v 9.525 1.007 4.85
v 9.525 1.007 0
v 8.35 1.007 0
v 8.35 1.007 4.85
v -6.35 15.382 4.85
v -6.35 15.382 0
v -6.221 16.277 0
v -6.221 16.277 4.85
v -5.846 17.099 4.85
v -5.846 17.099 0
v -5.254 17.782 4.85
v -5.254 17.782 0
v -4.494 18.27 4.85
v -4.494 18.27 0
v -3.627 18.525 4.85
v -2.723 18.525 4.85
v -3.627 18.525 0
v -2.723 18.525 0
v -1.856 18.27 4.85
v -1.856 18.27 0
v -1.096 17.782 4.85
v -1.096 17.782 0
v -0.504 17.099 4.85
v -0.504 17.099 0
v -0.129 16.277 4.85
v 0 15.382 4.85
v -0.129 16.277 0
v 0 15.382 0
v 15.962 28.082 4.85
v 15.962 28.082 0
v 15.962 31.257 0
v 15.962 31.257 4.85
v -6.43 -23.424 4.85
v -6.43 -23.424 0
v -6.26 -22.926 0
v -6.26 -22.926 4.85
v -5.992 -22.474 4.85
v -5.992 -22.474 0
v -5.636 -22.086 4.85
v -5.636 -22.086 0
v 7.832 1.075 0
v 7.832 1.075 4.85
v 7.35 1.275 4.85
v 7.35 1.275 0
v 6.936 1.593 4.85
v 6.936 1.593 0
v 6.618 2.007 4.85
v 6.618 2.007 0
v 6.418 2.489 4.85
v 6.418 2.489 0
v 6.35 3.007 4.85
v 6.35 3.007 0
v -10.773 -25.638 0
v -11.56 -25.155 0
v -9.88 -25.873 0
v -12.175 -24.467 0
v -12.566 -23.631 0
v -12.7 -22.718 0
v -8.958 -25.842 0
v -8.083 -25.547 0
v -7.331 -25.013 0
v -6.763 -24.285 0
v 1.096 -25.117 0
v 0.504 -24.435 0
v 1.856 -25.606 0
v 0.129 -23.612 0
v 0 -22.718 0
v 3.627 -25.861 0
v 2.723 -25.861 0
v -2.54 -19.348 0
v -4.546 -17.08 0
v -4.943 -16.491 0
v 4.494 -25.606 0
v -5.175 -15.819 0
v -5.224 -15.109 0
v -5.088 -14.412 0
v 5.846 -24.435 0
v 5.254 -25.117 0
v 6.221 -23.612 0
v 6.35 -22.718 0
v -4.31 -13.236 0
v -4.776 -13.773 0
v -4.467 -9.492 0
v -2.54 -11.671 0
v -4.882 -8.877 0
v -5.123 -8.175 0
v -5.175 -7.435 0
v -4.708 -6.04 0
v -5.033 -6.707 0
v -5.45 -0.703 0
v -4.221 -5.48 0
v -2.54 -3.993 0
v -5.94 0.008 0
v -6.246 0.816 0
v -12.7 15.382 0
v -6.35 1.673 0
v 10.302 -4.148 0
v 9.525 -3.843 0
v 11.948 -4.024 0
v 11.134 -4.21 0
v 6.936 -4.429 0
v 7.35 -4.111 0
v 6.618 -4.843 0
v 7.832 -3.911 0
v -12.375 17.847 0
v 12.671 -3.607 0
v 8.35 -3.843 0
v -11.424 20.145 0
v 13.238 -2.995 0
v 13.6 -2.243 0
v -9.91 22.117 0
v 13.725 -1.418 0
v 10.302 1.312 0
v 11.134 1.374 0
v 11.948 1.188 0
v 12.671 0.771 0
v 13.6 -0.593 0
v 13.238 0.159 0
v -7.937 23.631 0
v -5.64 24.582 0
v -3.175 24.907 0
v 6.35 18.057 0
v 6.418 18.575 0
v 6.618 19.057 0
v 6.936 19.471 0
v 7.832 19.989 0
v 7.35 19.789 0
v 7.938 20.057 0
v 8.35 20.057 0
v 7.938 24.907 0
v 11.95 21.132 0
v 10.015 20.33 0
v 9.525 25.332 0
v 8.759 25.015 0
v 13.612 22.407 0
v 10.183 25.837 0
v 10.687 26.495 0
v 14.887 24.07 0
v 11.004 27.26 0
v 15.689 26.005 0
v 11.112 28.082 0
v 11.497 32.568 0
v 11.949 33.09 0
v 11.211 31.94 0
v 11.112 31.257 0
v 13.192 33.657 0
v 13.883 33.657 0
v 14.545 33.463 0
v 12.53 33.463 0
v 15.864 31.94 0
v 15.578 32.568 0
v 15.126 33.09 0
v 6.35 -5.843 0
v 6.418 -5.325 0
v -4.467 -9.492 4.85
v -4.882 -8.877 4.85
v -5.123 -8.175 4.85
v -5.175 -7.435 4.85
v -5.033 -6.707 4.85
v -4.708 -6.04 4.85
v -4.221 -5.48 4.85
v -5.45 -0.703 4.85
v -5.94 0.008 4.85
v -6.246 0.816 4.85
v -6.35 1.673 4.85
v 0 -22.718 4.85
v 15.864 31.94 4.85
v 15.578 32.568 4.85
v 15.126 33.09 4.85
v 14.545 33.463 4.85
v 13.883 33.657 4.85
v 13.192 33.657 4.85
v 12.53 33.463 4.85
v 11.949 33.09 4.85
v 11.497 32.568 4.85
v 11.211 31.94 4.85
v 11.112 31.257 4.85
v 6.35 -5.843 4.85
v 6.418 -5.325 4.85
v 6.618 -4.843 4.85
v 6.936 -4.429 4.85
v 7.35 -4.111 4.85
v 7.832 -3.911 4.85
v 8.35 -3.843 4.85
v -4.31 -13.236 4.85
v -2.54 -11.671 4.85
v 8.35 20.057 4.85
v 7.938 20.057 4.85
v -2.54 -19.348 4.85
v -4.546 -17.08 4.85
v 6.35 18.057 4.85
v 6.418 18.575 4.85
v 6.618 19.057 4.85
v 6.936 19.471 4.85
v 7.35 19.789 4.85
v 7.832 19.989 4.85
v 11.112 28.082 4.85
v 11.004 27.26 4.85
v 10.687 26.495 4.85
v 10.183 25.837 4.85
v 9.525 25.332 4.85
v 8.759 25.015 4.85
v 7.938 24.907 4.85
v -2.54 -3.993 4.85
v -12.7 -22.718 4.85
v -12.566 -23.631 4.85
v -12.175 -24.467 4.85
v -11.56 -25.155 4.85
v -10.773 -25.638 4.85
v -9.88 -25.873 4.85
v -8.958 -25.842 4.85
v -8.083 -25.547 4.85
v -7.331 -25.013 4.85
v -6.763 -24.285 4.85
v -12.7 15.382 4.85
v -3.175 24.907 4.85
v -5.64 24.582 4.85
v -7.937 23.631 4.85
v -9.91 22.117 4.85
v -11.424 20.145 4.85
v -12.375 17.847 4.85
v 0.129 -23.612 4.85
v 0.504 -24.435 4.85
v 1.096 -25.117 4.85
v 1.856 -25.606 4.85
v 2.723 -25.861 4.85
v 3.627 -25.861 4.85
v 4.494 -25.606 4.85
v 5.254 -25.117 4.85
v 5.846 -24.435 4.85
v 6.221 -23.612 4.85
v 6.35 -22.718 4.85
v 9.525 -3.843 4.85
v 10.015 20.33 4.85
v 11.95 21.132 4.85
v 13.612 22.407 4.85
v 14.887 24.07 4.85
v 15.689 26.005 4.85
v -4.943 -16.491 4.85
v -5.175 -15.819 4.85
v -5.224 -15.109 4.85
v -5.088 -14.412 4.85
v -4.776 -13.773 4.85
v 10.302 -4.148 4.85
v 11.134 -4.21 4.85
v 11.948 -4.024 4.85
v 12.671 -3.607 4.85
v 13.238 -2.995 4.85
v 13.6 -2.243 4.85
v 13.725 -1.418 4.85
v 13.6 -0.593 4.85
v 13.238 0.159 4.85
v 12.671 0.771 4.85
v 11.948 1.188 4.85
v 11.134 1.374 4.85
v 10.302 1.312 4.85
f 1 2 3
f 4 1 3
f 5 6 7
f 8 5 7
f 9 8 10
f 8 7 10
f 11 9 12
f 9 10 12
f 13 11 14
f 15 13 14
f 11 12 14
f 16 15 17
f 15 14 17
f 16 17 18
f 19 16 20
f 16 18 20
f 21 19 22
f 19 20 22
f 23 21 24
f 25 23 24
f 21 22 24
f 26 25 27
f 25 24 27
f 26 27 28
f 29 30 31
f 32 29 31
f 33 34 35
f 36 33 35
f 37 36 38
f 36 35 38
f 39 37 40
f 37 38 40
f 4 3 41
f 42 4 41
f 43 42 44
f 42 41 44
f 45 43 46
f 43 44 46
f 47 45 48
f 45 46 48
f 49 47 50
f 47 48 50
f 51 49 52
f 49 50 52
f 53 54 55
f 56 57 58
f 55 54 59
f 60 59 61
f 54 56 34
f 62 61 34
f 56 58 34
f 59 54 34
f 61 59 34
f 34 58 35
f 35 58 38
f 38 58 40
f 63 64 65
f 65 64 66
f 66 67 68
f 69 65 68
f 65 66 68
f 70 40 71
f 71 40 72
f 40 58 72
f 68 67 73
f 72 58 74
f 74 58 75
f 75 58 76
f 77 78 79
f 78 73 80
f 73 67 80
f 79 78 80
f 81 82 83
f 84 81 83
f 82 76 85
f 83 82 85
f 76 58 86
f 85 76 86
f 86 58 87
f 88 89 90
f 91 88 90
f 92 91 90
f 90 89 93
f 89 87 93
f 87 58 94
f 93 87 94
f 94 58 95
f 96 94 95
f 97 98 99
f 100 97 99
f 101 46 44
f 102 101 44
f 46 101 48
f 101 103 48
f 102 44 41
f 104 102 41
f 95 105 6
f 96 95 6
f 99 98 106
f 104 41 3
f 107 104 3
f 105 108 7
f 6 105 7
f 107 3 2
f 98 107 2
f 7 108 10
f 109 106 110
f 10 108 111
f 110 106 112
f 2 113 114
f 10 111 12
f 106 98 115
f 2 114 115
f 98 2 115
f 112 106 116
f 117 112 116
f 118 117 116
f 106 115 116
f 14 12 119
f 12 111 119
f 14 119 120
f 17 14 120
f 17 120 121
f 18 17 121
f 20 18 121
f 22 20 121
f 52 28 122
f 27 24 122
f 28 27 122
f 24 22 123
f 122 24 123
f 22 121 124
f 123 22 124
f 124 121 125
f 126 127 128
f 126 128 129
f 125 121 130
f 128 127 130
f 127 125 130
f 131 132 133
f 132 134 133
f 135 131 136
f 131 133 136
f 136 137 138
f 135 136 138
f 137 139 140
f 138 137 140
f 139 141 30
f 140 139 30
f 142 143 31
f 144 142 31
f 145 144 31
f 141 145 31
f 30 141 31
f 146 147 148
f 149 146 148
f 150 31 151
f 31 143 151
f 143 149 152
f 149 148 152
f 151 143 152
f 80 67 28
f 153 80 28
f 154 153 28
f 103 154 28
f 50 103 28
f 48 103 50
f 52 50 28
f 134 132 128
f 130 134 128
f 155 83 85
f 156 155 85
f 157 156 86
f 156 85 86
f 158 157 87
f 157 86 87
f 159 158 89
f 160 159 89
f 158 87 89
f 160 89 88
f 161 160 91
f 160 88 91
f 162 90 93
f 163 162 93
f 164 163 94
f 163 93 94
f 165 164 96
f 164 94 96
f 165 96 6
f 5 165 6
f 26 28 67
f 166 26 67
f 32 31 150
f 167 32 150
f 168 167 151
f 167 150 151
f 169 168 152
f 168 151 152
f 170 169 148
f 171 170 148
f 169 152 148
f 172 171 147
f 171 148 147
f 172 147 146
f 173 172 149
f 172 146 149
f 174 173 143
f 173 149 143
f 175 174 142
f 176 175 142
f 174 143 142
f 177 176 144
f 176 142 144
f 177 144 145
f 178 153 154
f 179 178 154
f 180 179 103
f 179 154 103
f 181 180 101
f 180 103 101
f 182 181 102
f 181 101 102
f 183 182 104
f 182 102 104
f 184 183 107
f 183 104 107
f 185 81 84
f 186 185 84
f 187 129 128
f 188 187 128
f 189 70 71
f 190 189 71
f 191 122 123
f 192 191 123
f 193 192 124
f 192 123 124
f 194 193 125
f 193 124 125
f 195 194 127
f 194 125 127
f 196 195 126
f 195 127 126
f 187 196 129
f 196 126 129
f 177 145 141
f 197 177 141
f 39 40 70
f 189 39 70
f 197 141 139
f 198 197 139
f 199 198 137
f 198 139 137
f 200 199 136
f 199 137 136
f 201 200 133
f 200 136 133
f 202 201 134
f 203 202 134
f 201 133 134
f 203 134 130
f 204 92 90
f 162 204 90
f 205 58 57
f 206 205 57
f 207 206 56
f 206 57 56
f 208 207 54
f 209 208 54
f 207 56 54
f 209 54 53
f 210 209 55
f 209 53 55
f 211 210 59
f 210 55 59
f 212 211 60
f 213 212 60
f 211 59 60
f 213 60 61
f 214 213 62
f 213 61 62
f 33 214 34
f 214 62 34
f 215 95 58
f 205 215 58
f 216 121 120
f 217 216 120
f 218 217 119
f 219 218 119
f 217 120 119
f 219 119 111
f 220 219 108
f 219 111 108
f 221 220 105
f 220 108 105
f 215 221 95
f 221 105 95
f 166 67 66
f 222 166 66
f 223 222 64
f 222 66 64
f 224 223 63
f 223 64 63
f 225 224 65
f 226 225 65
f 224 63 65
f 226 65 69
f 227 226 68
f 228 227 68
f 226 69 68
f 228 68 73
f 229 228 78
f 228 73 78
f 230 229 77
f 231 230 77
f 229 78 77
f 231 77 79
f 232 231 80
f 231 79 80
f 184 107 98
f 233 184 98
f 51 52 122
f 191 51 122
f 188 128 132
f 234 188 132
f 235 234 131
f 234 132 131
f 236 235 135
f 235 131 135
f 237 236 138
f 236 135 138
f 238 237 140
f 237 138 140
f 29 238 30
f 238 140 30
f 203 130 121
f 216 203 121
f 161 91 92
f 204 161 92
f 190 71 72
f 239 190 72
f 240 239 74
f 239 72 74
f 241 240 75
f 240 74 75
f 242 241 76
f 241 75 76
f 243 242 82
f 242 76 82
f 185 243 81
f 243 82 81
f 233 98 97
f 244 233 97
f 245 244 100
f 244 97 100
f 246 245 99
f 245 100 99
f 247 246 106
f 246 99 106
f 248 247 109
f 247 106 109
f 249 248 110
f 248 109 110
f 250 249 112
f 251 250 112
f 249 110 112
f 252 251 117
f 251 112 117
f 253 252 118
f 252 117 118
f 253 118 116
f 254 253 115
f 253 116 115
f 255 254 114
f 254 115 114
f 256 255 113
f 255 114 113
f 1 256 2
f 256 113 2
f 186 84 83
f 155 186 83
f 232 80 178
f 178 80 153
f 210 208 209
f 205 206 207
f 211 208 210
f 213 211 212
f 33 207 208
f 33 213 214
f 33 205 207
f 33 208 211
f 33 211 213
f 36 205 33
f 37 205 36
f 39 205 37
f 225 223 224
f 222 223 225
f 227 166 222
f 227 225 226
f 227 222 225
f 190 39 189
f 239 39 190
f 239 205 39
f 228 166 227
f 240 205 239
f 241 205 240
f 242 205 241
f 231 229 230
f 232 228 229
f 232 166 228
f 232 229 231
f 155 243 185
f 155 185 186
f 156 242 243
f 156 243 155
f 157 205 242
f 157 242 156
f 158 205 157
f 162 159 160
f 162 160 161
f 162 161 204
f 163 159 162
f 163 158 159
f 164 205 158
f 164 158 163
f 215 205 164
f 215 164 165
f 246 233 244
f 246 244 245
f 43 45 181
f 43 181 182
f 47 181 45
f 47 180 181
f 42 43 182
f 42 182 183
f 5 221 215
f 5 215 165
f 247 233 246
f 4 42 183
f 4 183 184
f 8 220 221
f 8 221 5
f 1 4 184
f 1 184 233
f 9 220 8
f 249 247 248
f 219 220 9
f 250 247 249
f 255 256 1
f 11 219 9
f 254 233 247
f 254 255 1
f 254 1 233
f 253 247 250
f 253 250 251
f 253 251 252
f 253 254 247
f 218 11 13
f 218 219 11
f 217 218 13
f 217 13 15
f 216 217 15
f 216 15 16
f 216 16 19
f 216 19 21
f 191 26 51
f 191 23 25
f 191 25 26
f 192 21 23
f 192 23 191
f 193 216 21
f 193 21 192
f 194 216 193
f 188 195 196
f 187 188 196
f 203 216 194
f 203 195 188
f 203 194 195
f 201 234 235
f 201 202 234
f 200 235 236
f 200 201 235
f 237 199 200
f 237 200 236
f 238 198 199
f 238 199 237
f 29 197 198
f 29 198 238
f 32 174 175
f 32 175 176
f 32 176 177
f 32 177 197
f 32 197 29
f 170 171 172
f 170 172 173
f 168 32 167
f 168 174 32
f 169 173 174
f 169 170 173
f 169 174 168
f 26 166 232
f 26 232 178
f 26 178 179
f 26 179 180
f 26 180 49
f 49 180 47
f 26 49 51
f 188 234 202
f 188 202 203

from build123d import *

# Parameters (mm, degrees)
F3_DEPTH = 4.85


with BuildPart() as f3:
    # F2 (on Top) → F3 (new body)
    with BuildSketch(Plane.XY):
        with BuildLine():
            Line((7.9375, 24.907028094), (-3.175, 24.907028094))
            ThreePointArc((-3.175, 24.907028094), (-9.9101920908, 22.1172201848), (-12.7, 15.382028094))
            Line((-12.7, 15.382028094), (-12.7, -22.717971906))
            ThreePointArc((-12.7, -22.717971906), (-9.8802997587, -25.8730292877), (-6.4295199487, -23.4241080485))
            ThreePointArc((-6.4295199487, -23.4241080485), (-6.1376092102, -22.6929936641), (-5.6358581606, -22.0863751625))
            Line((-5.6358581606, -22.0863751625), (-2.54, -19.3483561519))
            Line((-2.54, -19.3483561519), (-4.5457479551, -17.0804715423))
            ThreePointArc((-4.5457479551, -17.0804715423), (-5.2240286378, -15.1094818757), (-4.3099453491, -13.2361648465))
            Line((-4.3099453491, -13.2361648465), (-2.54, -11.6708011372))
            Line((-2.54, -11.6708011372), (-4.4670308393, -9.4919213974))
            ThreePointArc((-4.4670308393, -9.4919213974), (-5.1749040056, -7.4349400744), (-4.2209404794, -5.4798927161))
            Line((-4.2209404794, -5.4798927161), (-2.54, -3.9932461226))
            Line((-2.54, -3.9932461226), (-5.4503163021, -0.702572669))
            ThreePointArc((-5.4503163021, -0.702572669), (-6.1175435561, 0.4027397661), (-6.35, 1.6727286595))
            Line((-6.35, 1.6727286595), (-6.35, 15.382028094))
            ThreePointArc((-6.35, 15.382028094), (-3.175, 18.557028094), (0, 15.382028094))
            Line((0, 15.382028094), (0, -22.717971906))
            ThreePointArc((0, -22.717971906), (3.175, -25.892971906), (6.35, -22.717971906))
            Line((6.35, -22.717971906), (6.35, -5.842971906))
            ThreePointArc((6.35, -5.842971906), (6.9357864376, -4.4287583436), (8.35, -3.842971906))
            Line((8.35, -3.842971906), (9.525, -3.842971906))
            ThreePointArc((9.525, -3.842971906), (13.7247767679, -1.417971906), (9.525, 1.007028094))
            Line((9.525, 1.007028094), (8.35, 1.007028094))
            ThreePointArc((8.35, 1.007028094), (6.9357864376, 1.5928145316), (6.35, 3.007028094))
            Line((6.35, 3.007028094), (6.35, 18.057028094))
            ThreePointArc((6.35, 18.057028094), (6.9357864376, 19.4712416564), (8.35, 20.057028094))
            Line((8.35, 20.057028094), (7.9375, 20.057028094))
            ThreePointArc((7.9375, 20.057028094), (13.612031919, 22.407496175), (15.9625, 28.082028094))
            Line((15.9625, 28.082028094), (15.9625, 31.257028094))
            ThreePointArc((15.9625, 31.257028094), (13.5375, 33.682028094), (11.1125, 31.257028094))
            Line((11.1125, 31.257028094), (11.1125, 28.082028094))
            ThreePointArc((11.1125, 28.082028094), (10.1825640303, 25.8369640637), (7.9375, 24.907028094))
        make_face()
    extrude(amount=F3_DEPTH)


solid = f3.part
